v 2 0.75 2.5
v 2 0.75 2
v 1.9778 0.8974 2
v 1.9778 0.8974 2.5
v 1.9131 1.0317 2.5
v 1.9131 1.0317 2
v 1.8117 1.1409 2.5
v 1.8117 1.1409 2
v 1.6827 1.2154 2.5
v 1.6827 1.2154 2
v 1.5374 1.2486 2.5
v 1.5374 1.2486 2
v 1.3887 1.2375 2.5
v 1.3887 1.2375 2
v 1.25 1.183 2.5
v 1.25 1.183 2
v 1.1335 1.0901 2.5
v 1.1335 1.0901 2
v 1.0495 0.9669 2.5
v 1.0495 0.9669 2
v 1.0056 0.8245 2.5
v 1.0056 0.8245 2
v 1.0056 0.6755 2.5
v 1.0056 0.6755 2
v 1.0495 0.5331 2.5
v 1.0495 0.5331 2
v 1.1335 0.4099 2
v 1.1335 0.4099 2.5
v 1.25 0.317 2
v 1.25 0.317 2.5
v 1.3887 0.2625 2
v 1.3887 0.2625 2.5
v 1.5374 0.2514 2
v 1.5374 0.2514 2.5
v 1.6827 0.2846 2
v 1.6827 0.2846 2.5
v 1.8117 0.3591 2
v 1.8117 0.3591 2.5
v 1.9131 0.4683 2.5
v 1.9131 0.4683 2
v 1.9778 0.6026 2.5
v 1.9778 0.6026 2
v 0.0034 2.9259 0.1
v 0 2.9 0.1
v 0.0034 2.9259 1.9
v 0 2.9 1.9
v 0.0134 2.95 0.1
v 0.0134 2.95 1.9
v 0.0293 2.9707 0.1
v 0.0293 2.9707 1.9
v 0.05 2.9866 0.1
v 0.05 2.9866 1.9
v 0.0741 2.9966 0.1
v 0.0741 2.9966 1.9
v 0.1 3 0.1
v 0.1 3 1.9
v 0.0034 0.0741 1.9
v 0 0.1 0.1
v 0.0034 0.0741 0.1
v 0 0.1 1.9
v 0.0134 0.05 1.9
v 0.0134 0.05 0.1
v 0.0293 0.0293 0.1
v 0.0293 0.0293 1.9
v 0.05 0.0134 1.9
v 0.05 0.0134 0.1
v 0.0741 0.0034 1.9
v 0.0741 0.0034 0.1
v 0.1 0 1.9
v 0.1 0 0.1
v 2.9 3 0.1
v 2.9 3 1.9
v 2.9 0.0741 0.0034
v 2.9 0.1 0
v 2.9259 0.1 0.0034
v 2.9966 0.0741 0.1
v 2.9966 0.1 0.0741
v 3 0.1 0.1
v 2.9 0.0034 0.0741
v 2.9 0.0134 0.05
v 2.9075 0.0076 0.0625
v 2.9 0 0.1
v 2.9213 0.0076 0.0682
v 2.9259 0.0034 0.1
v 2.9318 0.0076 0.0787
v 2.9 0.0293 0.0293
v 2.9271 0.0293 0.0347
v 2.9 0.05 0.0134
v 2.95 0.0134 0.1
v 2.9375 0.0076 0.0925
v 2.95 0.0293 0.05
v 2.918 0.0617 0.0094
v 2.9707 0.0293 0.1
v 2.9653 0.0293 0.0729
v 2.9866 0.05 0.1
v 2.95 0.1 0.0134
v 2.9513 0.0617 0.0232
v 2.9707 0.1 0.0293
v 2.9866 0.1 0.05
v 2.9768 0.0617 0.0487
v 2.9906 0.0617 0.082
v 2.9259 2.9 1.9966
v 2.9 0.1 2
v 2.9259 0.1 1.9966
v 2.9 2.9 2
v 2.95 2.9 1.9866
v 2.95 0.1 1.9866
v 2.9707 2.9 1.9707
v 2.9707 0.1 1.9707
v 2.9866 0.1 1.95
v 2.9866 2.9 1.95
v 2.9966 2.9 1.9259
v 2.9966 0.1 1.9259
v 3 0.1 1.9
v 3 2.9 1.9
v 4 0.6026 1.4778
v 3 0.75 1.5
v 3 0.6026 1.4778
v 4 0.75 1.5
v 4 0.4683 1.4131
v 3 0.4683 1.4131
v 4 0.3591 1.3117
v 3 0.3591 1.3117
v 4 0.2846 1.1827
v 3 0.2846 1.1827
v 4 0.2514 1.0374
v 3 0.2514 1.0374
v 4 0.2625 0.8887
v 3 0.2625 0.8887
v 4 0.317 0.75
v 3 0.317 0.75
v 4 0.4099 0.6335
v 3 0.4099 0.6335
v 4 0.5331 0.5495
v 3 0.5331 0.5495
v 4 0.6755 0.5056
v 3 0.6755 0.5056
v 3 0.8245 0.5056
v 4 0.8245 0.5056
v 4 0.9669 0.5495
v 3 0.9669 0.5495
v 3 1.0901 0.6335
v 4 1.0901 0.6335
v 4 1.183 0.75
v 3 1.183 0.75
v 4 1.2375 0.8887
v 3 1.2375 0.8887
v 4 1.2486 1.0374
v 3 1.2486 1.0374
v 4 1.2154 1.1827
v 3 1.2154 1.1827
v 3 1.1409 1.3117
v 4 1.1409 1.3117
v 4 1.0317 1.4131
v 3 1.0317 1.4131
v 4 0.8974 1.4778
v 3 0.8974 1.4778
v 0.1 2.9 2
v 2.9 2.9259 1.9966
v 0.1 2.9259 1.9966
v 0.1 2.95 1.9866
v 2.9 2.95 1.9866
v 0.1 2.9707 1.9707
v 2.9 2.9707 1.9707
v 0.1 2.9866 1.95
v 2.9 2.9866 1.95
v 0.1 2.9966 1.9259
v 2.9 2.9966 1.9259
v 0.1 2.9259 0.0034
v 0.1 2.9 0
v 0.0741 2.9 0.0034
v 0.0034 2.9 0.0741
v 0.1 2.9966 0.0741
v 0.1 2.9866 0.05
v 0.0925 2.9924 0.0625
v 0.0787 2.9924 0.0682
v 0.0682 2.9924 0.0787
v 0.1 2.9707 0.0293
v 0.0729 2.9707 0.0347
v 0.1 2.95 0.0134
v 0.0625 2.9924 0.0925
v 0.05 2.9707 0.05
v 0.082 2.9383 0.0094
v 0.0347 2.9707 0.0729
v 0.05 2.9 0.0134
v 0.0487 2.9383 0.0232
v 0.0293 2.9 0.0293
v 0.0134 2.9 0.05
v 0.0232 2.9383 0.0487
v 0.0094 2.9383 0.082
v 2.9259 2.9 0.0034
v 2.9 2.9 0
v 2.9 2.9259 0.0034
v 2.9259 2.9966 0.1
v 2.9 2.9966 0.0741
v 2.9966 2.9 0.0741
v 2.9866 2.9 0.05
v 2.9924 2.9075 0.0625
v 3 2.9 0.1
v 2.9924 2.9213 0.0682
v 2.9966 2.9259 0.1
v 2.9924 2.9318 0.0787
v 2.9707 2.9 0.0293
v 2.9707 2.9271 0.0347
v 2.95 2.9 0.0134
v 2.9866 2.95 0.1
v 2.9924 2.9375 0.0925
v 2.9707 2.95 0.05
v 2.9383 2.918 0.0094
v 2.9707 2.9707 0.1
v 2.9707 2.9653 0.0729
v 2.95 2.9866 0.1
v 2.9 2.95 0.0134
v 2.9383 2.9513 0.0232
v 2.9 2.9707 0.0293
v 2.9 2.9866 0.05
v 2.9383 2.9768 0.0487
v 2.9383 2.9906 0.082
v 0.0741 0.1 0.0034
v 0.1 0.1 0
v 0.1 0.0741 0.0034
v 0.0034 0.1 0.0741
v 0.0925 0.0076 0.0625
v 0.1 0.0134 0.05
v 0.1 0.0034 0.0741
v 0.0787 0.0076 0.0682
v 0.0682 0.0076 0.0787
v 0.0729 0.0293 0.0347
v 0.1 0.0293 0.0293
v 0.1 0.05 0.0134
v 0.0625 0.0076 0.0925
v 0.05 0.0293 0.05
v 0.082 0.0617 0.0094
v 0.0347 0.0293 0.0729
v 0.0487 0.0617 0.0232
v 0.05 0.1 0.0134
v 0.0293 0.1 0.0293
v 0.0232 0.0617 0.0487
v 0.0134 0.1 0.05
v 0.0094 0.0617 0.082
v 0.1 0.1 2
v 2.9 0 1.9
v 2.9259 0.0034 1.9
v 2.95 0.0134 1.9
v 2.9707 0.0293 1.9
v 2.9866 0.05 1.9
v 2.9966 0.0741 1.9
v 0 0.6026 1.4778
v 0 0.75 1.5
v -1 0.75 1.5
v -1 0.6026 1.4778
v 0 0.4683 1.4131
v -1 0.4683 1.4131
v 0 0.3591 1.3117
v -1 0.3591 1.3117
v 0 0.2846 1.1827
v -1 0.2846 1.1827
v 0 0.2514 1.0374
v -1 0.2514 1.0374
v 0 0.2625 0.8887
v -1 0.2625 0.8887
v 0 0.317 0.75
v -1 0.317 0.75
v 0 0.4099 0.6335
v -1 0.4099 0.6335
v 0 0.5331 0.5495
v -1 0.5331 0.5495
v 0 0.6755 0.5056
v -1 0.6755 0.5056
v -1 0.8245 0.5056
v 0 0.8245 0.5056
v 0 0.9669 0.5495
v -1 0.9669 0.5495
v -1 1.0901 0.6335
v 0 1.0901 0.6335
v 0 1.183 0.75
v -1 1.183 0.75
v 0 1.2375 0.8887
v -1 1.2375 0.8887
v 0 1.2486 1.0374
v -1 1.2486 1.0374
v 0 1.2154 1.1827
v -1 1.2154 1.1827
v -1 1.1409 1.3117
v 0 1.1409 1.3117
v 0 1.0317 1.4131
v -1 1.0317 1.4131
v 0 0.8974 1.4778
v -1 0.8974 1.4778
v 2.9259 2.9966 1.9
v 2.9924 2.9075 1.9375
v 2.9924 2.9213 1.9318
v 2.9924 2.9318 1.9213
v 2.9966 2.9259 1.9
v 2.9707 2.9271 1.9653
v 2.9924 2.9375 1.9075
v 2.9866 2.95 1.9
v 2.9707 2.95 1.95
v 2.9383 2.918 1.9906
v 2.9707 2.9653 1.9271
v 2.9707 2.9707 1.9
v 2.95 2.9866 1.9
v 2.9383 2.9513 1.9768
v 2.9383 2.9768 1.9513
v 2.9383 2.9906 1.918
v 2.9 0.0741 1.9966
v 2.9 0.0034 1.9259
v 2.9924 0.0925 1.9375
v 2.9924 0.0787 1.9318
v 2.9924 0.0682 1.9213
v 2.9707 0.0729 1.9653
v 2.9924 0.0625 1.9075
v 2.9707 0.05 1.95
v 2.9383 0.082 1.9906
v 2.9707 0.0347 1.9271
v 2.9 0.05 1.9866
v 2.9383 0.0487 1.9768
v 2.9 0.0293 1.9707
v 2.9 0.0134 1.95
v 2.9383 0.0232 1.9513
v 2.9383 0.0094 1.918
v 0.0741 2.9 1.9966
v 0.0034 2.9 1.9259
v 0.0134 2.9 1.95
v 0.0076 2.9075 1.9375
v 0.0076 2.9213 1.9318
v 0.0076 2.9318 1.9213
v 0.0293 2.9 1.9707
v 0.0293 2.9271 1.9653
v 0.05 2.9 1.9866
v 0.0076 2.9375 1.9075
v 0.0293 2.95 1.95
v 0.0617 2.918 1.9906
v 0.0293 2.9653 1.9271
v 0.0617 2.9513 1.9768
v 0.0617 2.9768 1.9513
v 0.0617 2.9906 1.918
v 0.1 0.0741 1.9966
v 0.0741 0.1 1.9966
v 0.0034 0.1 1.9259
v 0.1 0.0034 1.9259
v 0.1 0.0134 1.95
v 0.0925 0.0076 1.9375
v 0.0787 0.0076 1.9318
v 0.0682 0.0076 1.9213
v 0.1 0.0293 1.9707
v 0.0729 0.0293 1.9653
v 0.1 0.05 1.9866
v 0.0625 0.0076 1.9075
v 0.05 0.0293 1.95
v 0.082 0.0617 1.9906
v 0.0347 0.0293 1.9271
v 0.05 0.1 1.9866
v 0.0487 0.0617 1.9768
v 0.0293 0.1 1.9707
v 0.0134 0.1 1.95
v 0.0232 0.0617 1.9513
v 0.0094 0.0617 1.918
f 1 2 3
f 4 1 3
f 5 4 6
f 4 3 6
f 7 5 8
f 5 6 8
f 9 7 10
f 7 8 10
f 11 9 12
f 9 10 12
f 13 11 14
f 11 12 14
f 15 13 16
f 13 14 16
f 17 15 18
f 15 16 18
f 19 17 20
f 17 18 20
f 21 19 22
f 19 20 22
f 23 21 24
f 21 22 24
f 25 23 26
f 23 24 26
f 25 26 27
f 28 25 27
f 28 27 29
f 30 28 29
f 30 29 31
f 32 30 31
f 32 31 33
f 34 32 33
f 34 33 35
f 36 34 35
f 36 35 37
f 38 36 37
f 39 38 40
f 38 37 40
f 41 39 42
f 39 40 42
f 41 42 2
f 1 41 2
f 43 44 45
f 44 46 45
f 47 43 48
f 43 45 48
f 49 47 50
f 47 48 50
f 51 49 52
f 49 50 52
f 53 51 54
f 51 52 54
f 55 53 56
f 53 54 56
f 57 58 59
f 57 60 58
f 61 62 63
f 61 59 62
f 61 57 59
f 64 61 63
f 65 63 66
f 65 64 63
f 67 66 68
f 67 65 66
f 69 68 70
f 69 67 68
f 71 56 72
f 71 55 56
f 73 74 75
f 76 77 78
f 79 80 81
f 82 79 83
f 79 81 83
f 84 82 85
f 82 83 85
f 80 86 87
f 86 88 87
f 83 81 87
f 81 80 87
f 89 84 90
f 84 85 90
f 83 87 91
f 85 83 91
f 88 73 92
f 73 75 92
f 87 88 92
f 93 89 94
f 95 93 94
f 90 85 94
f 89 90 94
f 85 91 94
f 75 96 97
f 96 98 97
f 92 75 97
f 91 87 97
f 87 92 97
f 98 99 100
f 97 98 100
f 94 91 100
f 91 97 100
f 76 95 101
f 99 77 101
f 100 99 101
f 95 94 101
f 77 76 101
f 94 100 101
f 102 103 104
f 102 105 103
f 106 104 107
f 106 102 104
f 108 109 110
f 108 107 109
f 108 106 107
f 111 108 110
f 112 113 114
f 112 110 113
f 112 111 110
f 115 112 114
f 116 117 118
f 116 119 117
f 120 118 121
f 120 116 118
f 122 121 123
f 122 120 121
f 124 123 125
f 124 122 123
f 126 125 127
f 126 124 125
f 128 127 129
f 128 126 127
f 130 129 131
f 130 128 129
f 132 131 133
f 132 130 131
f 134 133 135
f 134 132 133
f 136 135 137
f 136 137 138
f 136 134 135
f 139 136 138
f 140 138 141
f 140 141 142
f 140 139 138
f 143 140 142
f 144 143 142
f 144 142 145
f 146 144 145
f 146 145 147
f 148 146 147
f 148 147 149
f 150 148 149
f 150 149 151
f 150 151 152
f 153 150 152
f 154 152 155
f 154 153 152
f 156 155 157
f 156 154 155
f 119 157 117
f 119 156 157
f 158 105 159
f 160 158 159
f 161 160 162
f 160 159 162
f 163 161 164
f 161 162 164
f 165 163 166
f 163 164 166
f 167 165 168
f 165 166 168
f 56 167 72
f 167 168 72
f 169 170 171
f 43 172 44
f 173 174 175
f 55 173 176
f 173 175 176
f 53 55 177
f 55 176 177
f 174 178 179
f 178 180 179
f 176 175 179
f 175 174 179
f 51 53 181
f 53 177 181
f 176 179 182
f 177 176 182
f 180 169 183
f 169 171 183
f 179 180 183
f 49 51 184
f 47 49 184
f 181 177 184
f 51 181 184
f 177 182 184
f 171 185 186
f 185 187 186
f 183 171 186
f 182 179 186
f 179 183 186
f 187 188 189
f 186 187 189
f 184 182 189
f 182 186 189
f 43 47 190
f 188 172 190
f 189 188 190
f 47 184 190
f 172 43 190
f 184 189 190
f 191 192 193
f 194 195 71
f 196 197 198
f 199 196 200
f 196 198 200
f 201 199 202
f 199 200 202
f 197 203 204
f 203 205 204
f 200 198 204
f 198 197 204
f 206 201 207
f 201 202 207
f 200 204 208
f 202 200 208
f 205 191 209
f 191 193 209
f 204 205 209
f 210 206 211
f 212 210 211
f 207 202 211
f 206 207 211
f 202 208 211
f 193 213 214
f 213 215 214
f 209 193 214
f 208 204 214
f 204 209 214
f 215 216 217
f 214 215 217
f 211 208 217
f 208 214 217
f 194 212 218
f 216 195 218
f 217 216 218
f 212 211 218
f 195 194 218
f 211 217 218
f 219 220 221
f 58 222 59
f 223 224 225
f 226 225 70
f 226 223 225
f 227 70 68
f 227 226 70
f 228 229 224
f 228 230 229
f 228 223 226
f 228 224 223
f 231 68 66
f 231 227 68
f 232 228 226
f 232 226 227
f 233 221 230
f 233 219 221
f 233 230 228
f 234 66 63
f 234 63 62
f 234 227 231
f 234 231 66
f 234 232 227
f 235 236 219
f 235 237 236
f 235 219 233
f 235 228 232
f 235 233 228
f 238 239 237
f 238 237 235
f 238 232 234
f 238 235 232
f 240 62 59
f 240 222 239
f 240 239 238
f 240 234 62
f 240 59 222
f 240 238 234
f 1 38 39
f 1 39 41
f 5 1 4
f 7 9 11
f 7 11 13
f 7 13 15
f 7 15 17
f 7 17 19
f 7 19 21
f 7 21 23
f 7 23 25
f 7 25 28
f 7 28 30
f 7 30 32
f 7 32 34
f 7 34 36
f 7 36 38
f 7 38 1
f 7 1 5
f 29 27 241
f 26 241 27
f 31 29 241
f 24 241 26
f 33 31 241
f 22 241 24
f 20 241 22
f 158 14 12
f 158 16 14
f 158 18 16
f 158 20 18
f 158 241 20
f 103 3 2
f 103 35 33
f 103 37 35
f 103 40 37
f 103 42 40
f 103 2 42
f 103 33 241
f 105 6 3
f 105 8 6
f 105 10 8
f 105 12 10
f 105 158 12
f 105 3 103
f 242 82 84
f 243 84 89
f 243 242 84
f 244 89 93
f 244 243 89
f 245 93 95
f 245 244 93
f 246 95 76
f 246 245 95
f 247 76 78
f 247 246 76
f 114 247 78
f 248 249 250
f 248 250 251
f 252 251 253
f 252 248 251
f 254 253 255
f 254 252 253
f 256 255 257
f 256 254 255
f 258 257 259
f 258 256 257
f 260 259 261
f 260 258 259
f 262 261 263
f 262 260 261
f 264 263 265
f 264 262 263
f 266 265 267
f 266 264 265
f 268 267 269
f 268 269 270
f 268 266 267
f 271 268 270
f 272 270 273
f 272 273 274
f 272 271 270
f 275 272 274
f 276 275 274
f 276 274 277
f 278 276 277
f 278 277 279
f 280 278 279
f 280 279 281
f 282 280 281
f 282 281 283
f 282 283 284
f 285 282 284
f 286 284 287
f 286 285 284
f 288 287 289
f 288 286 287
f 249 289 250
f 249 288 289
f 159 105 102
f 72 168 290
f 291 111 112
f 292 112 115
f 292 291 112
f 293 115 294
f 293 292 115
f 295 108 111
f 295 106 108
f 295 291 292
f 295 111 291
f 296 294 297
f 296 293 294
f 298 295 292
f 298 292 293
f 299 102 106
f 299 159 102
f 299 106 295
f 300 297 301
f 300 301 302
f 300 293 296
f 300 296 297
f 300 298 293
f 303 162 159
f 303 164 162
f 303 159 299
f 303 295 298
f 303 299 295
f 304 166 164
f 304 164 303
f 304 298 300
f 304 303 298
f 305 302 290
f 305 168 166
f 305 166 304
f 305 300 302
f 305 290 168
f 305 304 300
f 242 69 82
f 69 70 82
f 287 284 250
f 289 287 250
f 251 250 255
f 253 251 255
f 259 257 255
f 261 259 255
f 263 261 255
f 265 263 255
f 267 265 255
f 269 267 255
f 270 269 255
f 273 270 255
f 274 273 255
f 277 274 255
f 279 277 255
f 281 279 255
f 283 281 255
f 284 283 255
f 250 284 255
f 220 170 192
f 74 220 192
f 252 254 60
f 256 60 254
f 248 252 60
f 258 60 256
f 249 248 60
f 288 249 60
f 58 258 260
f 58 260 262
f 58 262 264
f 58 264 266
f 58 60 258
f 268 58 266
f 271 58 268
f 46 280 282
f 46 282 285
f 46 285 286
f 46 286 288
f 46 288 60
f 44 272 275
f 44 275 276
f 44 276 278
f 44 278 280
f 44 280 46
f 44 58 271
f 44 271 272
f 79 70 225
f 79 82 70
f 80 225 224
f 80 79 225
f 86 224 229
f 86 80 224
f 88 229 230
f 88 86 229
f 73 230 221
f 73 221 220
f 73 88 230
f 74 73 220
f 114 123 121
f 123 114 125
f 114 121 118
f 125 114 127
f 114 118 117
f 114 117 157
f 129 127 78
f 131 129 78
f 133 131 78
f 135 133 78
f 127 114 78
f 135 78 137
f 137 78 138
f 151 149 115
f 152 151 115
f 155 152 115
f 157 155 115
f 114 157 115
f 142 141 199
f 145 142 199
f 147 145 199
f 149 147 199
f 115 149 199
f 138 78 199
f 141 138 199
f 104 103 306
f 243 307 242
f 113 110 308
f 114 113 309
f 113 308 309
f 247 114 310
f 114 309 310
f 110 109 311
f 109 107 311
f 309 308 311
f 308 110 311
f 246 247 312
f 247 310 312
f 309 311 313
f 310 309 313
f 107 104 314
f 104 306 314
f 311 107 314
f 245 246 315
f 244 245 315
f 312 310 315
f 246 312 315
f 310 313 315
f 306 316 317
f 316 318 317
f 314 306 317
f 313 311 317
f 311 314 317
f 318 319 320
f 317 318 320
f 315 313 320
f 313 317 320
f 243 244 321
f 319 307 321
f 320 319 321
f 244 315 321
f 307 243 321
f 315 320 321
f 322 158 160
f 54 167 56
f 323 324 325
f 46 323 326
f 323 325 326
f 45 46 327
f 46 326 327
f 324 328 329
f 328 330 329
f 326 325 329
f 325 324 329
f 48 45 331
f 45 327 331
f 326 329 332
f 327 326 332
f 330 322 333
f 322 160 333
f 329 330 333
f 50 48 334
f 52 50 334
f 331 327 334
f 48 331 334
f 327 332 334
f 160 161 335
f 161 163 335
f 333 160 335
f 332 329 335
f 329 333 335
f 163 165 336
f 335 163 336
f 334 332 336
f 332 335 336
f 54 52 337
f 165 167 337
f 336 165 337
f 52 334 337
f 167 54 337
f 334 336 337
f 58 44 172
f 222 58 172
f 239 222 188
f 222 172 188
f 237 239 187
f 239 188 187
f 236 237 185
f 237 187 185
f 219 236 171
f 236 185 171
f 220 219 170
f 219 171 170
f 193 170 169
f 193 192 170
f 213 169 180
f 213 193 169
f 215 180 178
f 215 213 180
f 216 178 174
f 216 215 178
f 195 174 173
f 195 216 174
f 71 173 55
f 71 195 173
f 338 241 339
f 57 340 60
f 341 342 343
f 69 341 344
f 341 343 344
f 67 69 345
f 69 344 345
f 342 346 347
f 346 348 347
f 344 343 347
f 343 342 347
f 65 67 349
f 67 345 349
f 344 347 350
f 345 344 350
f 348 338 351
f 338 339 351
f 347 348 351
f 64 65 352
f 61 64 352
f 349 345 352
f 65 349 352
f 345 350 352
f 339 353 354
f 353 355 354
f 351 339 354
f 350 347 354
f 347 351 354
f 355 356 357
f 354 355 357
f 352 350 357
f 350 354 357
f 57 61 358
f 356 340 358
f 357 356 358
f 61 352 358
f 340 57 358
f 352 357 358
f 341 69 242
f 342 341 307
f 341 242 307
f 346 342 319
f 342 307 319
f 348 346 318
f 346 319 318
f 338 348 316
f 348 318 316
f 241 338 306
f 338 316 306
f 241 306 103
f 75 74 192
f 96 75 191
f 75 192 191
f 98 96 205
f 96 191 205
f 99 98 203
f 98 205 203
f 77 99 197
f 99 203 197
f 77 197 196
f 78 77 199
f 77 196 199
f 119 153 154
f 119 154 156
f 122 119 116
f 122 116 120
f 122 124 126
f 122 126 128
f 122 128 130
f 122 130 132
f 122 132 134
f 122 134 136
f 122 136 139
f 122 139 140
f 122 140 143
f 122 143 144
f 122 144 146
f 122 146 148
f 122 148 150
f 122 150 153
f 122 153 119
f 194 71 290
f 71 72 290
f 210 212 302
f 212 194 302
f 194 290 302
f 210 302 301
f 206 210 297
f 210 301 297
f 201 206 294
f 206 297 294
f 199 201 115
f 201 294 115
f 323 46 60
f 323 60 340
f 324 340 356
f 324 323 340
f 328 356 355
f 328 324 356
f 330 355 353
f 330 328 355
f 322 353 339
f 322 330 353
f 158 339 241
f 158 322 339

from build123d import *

# Parameters (mm, degrees)
SKETCH1_W           = 3
SKETCH1_H           = 3
BOSS_EXTRUDE1_DEPTH = 2
SKETCH3_R           = 0.5
BOSS_EXTRUDE2_DEPTH = 2.5
FILLET1_R           = 0.1
SKETCH4_R           = 0.5
BOSS_EXTRUDE3_DEPTH = 0.5


with BuildPart() as part:
    # Sketch1 → Boss-Extrude1 (new body)
    with BuildSketch(Plane.XY):
        with Locations((1.5, 1.5)):
            Rectangle(SKETCH1_W, SKETCH1_H)
    extrude(amount=BOSS_EXTRUDE1_DEPTH)

    # Sketch3 → Boss-Extrude2 (add, symmetric)
    with BuildSketch(Plane(origin=(1.5, 0, 0), x_dir=(0, 0, -1), z_dir=(1, 0, 0))):
        with Locations(Location((-1, 0.75, 0), (0, 0, 180))):
            Circle(SKETCH3_R)
    extrude(amount=BOSS_EXTRUDE2_DEPTH, both=True)

    # Fillet1
    fillet1_edges = [part.edges().sort_by_distance(p)[0] for p in [
        (1.5, 3, 2),
        (0, 1.5, 2),
        (1.5, 0, 2),
        (0, 1.5, 0),
        (1.5, 3, 0),
        (3, 1.5, 0),
        (1.5, 0, 0),
        (3, 1.5, 2),
        (0, 0, 1),
        (0, 3, 1),
        (3, 3, 1),
        (3, 0, 1),
    ]]
    fillet(fillet1_edges, radius=FILLET1_R)

    # Sketch4 → Boss-Extrude3 (add)
    with BuildSketch(Plane.XY.offset(2)):
        with Locations((1.5, 0.75)):
            Circle(SKETCH4_R)
    extrude(amount=BOSS_EXTRUDE3_DEPTH)


solid = part.part
